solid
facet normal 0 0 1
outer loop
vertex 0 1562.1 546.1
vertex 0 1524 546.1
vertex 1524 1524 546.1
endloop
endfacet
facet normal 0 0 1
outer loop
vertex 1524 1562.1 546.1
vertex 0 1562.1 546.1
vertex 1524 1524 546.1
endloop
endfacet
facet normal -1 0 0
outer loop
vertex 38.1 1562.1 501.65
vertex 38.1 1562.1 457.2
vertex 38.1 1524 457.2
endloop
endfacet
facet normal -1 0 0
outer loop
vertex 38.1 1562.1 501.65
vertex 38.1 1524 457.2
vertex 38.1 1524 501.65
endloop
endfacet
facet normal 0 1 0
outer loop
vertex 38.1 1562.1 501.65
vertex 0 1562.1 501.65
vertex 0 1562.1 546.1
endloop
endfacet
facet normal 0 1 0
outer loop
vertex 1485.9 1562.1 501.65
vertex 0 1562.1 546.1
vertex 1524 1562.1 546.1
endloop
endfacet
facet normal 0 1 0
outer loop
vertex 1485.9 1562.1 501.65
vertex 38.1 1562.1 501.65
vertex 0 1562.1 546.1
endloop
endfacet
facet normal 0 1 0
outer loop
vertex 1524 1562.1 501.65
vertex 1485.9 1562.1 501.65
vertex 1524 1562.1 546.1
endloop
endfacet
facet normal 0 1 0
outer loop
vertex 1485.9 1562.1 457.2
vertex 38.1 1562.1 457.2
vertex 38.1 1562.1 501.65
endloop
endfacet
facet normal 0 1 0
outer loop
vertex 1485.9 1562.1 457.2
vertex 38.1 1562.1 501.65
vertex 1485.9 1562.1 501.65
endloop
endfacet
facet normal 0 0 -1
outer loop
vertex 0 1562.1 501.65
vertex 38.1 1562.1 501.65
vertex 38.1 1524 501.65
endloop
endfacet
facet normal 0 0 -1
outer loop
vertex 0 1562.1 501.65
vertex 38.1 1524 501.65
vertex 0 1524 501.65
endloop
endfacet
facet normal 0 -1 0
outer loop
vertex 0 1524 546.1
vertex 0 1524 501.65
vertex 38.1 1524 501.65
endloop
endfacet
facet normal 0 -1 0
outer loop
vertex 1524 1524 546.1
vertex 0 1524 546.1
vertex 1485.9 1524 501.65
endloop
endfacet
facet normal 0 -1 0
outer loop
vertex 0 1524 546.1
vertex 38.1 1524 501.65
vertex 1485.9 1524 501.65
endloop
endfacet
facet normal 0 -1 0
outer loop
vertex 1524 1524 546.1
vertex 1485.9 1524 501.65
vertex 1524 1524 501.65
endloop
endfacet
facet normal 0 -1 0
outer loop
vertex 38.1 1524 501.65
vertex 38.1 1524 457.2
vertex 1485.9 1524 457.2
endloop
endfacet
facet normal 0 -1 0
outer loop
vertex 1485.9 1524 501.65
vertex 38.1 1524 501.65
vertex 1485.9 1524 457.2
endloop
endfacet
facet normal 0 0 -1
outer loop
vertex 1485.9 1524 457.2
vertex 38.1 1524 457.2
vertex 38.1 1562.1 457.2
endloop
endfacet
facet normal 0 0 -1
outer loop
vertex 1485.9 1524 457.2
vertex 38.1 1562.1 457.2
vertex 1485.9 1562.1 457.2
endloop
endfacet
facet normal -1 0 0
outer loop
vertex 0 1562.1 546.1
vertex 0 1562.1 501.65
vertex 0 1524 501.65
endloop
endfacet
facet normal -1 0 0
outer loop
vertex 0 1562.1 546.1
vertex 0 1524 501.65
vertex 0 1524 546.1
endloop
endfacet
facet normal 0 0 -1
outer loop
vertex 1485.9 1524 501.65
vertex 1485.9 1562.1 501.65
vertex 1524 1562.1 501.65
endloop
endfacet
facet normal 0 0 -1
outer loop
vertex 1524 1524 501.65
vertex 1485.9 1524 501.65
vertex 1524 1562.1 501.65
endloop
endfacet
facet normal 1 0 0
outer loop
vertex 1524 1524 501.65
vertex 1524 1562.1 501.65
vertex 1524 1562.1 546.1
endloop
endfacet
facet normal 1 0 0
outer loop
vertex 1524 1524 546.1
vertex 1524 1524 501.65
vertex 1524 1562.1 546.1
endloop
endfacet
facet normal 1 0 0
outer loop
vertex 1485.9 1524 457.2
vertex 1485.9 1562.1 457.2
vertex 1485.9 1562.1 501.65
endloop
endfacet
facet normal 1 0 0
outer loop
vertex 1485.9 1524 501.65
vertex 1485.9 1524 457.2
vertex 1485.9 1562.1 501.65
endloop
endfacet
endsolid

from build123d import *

# Parameters (mm, degrees)
BOX008_W        = 1828.8
BOX008_H        = 38.1
BOX008_DEPTH    = 88.9
POCKET005_DEPTH = 38.1010000002


with BuildPart() as pocket005:
    # Box008 → Box008 (new body)
    with BuildSketch(Plane(origin=(-152.4, -38.1, 457.2), x_dir=(1, 0, 0), z_dir=(0, 0, 1))):
        with Locations((914.4, 19.05)):
            Rectangle(BOX008_W, BOX008_H)
    extrude(amount=BOX008_DEPTH)

    # Sketch005 → Pocket005 (cut, through all)
    with BuildSketch(Plane(origin=(-152.4, -38.1, 457.2), x_dir=(1, 0, 0), z_dir=(0, -1, 0))):
        Polygon((190.5, 44.45), (152.4, 44.45), (152.4, 88.9), (0, 88.9), (0, 0), (190.5, 0), align=None)
        Polygon((1638.3, 44.45), (1676.4, 44.45), (1676.4, 88.9), (1828.8, 88.9), (1828.8, 0), (1638.3, 0), align=None)
    extrude(amount=-POCKET005_DEPTH, mode=Mode.SUBTRACT)


with BuildPart() as southfloorbeam:
    # Part__Mirroring003: instance of Pocket005
    add(pocket005.part.mirror(Plane(origin=(0, 762, 0), x_dir=(1, 0, 0), z_dir=(0, 1, 0))))


solid = southfloorbeam.part
